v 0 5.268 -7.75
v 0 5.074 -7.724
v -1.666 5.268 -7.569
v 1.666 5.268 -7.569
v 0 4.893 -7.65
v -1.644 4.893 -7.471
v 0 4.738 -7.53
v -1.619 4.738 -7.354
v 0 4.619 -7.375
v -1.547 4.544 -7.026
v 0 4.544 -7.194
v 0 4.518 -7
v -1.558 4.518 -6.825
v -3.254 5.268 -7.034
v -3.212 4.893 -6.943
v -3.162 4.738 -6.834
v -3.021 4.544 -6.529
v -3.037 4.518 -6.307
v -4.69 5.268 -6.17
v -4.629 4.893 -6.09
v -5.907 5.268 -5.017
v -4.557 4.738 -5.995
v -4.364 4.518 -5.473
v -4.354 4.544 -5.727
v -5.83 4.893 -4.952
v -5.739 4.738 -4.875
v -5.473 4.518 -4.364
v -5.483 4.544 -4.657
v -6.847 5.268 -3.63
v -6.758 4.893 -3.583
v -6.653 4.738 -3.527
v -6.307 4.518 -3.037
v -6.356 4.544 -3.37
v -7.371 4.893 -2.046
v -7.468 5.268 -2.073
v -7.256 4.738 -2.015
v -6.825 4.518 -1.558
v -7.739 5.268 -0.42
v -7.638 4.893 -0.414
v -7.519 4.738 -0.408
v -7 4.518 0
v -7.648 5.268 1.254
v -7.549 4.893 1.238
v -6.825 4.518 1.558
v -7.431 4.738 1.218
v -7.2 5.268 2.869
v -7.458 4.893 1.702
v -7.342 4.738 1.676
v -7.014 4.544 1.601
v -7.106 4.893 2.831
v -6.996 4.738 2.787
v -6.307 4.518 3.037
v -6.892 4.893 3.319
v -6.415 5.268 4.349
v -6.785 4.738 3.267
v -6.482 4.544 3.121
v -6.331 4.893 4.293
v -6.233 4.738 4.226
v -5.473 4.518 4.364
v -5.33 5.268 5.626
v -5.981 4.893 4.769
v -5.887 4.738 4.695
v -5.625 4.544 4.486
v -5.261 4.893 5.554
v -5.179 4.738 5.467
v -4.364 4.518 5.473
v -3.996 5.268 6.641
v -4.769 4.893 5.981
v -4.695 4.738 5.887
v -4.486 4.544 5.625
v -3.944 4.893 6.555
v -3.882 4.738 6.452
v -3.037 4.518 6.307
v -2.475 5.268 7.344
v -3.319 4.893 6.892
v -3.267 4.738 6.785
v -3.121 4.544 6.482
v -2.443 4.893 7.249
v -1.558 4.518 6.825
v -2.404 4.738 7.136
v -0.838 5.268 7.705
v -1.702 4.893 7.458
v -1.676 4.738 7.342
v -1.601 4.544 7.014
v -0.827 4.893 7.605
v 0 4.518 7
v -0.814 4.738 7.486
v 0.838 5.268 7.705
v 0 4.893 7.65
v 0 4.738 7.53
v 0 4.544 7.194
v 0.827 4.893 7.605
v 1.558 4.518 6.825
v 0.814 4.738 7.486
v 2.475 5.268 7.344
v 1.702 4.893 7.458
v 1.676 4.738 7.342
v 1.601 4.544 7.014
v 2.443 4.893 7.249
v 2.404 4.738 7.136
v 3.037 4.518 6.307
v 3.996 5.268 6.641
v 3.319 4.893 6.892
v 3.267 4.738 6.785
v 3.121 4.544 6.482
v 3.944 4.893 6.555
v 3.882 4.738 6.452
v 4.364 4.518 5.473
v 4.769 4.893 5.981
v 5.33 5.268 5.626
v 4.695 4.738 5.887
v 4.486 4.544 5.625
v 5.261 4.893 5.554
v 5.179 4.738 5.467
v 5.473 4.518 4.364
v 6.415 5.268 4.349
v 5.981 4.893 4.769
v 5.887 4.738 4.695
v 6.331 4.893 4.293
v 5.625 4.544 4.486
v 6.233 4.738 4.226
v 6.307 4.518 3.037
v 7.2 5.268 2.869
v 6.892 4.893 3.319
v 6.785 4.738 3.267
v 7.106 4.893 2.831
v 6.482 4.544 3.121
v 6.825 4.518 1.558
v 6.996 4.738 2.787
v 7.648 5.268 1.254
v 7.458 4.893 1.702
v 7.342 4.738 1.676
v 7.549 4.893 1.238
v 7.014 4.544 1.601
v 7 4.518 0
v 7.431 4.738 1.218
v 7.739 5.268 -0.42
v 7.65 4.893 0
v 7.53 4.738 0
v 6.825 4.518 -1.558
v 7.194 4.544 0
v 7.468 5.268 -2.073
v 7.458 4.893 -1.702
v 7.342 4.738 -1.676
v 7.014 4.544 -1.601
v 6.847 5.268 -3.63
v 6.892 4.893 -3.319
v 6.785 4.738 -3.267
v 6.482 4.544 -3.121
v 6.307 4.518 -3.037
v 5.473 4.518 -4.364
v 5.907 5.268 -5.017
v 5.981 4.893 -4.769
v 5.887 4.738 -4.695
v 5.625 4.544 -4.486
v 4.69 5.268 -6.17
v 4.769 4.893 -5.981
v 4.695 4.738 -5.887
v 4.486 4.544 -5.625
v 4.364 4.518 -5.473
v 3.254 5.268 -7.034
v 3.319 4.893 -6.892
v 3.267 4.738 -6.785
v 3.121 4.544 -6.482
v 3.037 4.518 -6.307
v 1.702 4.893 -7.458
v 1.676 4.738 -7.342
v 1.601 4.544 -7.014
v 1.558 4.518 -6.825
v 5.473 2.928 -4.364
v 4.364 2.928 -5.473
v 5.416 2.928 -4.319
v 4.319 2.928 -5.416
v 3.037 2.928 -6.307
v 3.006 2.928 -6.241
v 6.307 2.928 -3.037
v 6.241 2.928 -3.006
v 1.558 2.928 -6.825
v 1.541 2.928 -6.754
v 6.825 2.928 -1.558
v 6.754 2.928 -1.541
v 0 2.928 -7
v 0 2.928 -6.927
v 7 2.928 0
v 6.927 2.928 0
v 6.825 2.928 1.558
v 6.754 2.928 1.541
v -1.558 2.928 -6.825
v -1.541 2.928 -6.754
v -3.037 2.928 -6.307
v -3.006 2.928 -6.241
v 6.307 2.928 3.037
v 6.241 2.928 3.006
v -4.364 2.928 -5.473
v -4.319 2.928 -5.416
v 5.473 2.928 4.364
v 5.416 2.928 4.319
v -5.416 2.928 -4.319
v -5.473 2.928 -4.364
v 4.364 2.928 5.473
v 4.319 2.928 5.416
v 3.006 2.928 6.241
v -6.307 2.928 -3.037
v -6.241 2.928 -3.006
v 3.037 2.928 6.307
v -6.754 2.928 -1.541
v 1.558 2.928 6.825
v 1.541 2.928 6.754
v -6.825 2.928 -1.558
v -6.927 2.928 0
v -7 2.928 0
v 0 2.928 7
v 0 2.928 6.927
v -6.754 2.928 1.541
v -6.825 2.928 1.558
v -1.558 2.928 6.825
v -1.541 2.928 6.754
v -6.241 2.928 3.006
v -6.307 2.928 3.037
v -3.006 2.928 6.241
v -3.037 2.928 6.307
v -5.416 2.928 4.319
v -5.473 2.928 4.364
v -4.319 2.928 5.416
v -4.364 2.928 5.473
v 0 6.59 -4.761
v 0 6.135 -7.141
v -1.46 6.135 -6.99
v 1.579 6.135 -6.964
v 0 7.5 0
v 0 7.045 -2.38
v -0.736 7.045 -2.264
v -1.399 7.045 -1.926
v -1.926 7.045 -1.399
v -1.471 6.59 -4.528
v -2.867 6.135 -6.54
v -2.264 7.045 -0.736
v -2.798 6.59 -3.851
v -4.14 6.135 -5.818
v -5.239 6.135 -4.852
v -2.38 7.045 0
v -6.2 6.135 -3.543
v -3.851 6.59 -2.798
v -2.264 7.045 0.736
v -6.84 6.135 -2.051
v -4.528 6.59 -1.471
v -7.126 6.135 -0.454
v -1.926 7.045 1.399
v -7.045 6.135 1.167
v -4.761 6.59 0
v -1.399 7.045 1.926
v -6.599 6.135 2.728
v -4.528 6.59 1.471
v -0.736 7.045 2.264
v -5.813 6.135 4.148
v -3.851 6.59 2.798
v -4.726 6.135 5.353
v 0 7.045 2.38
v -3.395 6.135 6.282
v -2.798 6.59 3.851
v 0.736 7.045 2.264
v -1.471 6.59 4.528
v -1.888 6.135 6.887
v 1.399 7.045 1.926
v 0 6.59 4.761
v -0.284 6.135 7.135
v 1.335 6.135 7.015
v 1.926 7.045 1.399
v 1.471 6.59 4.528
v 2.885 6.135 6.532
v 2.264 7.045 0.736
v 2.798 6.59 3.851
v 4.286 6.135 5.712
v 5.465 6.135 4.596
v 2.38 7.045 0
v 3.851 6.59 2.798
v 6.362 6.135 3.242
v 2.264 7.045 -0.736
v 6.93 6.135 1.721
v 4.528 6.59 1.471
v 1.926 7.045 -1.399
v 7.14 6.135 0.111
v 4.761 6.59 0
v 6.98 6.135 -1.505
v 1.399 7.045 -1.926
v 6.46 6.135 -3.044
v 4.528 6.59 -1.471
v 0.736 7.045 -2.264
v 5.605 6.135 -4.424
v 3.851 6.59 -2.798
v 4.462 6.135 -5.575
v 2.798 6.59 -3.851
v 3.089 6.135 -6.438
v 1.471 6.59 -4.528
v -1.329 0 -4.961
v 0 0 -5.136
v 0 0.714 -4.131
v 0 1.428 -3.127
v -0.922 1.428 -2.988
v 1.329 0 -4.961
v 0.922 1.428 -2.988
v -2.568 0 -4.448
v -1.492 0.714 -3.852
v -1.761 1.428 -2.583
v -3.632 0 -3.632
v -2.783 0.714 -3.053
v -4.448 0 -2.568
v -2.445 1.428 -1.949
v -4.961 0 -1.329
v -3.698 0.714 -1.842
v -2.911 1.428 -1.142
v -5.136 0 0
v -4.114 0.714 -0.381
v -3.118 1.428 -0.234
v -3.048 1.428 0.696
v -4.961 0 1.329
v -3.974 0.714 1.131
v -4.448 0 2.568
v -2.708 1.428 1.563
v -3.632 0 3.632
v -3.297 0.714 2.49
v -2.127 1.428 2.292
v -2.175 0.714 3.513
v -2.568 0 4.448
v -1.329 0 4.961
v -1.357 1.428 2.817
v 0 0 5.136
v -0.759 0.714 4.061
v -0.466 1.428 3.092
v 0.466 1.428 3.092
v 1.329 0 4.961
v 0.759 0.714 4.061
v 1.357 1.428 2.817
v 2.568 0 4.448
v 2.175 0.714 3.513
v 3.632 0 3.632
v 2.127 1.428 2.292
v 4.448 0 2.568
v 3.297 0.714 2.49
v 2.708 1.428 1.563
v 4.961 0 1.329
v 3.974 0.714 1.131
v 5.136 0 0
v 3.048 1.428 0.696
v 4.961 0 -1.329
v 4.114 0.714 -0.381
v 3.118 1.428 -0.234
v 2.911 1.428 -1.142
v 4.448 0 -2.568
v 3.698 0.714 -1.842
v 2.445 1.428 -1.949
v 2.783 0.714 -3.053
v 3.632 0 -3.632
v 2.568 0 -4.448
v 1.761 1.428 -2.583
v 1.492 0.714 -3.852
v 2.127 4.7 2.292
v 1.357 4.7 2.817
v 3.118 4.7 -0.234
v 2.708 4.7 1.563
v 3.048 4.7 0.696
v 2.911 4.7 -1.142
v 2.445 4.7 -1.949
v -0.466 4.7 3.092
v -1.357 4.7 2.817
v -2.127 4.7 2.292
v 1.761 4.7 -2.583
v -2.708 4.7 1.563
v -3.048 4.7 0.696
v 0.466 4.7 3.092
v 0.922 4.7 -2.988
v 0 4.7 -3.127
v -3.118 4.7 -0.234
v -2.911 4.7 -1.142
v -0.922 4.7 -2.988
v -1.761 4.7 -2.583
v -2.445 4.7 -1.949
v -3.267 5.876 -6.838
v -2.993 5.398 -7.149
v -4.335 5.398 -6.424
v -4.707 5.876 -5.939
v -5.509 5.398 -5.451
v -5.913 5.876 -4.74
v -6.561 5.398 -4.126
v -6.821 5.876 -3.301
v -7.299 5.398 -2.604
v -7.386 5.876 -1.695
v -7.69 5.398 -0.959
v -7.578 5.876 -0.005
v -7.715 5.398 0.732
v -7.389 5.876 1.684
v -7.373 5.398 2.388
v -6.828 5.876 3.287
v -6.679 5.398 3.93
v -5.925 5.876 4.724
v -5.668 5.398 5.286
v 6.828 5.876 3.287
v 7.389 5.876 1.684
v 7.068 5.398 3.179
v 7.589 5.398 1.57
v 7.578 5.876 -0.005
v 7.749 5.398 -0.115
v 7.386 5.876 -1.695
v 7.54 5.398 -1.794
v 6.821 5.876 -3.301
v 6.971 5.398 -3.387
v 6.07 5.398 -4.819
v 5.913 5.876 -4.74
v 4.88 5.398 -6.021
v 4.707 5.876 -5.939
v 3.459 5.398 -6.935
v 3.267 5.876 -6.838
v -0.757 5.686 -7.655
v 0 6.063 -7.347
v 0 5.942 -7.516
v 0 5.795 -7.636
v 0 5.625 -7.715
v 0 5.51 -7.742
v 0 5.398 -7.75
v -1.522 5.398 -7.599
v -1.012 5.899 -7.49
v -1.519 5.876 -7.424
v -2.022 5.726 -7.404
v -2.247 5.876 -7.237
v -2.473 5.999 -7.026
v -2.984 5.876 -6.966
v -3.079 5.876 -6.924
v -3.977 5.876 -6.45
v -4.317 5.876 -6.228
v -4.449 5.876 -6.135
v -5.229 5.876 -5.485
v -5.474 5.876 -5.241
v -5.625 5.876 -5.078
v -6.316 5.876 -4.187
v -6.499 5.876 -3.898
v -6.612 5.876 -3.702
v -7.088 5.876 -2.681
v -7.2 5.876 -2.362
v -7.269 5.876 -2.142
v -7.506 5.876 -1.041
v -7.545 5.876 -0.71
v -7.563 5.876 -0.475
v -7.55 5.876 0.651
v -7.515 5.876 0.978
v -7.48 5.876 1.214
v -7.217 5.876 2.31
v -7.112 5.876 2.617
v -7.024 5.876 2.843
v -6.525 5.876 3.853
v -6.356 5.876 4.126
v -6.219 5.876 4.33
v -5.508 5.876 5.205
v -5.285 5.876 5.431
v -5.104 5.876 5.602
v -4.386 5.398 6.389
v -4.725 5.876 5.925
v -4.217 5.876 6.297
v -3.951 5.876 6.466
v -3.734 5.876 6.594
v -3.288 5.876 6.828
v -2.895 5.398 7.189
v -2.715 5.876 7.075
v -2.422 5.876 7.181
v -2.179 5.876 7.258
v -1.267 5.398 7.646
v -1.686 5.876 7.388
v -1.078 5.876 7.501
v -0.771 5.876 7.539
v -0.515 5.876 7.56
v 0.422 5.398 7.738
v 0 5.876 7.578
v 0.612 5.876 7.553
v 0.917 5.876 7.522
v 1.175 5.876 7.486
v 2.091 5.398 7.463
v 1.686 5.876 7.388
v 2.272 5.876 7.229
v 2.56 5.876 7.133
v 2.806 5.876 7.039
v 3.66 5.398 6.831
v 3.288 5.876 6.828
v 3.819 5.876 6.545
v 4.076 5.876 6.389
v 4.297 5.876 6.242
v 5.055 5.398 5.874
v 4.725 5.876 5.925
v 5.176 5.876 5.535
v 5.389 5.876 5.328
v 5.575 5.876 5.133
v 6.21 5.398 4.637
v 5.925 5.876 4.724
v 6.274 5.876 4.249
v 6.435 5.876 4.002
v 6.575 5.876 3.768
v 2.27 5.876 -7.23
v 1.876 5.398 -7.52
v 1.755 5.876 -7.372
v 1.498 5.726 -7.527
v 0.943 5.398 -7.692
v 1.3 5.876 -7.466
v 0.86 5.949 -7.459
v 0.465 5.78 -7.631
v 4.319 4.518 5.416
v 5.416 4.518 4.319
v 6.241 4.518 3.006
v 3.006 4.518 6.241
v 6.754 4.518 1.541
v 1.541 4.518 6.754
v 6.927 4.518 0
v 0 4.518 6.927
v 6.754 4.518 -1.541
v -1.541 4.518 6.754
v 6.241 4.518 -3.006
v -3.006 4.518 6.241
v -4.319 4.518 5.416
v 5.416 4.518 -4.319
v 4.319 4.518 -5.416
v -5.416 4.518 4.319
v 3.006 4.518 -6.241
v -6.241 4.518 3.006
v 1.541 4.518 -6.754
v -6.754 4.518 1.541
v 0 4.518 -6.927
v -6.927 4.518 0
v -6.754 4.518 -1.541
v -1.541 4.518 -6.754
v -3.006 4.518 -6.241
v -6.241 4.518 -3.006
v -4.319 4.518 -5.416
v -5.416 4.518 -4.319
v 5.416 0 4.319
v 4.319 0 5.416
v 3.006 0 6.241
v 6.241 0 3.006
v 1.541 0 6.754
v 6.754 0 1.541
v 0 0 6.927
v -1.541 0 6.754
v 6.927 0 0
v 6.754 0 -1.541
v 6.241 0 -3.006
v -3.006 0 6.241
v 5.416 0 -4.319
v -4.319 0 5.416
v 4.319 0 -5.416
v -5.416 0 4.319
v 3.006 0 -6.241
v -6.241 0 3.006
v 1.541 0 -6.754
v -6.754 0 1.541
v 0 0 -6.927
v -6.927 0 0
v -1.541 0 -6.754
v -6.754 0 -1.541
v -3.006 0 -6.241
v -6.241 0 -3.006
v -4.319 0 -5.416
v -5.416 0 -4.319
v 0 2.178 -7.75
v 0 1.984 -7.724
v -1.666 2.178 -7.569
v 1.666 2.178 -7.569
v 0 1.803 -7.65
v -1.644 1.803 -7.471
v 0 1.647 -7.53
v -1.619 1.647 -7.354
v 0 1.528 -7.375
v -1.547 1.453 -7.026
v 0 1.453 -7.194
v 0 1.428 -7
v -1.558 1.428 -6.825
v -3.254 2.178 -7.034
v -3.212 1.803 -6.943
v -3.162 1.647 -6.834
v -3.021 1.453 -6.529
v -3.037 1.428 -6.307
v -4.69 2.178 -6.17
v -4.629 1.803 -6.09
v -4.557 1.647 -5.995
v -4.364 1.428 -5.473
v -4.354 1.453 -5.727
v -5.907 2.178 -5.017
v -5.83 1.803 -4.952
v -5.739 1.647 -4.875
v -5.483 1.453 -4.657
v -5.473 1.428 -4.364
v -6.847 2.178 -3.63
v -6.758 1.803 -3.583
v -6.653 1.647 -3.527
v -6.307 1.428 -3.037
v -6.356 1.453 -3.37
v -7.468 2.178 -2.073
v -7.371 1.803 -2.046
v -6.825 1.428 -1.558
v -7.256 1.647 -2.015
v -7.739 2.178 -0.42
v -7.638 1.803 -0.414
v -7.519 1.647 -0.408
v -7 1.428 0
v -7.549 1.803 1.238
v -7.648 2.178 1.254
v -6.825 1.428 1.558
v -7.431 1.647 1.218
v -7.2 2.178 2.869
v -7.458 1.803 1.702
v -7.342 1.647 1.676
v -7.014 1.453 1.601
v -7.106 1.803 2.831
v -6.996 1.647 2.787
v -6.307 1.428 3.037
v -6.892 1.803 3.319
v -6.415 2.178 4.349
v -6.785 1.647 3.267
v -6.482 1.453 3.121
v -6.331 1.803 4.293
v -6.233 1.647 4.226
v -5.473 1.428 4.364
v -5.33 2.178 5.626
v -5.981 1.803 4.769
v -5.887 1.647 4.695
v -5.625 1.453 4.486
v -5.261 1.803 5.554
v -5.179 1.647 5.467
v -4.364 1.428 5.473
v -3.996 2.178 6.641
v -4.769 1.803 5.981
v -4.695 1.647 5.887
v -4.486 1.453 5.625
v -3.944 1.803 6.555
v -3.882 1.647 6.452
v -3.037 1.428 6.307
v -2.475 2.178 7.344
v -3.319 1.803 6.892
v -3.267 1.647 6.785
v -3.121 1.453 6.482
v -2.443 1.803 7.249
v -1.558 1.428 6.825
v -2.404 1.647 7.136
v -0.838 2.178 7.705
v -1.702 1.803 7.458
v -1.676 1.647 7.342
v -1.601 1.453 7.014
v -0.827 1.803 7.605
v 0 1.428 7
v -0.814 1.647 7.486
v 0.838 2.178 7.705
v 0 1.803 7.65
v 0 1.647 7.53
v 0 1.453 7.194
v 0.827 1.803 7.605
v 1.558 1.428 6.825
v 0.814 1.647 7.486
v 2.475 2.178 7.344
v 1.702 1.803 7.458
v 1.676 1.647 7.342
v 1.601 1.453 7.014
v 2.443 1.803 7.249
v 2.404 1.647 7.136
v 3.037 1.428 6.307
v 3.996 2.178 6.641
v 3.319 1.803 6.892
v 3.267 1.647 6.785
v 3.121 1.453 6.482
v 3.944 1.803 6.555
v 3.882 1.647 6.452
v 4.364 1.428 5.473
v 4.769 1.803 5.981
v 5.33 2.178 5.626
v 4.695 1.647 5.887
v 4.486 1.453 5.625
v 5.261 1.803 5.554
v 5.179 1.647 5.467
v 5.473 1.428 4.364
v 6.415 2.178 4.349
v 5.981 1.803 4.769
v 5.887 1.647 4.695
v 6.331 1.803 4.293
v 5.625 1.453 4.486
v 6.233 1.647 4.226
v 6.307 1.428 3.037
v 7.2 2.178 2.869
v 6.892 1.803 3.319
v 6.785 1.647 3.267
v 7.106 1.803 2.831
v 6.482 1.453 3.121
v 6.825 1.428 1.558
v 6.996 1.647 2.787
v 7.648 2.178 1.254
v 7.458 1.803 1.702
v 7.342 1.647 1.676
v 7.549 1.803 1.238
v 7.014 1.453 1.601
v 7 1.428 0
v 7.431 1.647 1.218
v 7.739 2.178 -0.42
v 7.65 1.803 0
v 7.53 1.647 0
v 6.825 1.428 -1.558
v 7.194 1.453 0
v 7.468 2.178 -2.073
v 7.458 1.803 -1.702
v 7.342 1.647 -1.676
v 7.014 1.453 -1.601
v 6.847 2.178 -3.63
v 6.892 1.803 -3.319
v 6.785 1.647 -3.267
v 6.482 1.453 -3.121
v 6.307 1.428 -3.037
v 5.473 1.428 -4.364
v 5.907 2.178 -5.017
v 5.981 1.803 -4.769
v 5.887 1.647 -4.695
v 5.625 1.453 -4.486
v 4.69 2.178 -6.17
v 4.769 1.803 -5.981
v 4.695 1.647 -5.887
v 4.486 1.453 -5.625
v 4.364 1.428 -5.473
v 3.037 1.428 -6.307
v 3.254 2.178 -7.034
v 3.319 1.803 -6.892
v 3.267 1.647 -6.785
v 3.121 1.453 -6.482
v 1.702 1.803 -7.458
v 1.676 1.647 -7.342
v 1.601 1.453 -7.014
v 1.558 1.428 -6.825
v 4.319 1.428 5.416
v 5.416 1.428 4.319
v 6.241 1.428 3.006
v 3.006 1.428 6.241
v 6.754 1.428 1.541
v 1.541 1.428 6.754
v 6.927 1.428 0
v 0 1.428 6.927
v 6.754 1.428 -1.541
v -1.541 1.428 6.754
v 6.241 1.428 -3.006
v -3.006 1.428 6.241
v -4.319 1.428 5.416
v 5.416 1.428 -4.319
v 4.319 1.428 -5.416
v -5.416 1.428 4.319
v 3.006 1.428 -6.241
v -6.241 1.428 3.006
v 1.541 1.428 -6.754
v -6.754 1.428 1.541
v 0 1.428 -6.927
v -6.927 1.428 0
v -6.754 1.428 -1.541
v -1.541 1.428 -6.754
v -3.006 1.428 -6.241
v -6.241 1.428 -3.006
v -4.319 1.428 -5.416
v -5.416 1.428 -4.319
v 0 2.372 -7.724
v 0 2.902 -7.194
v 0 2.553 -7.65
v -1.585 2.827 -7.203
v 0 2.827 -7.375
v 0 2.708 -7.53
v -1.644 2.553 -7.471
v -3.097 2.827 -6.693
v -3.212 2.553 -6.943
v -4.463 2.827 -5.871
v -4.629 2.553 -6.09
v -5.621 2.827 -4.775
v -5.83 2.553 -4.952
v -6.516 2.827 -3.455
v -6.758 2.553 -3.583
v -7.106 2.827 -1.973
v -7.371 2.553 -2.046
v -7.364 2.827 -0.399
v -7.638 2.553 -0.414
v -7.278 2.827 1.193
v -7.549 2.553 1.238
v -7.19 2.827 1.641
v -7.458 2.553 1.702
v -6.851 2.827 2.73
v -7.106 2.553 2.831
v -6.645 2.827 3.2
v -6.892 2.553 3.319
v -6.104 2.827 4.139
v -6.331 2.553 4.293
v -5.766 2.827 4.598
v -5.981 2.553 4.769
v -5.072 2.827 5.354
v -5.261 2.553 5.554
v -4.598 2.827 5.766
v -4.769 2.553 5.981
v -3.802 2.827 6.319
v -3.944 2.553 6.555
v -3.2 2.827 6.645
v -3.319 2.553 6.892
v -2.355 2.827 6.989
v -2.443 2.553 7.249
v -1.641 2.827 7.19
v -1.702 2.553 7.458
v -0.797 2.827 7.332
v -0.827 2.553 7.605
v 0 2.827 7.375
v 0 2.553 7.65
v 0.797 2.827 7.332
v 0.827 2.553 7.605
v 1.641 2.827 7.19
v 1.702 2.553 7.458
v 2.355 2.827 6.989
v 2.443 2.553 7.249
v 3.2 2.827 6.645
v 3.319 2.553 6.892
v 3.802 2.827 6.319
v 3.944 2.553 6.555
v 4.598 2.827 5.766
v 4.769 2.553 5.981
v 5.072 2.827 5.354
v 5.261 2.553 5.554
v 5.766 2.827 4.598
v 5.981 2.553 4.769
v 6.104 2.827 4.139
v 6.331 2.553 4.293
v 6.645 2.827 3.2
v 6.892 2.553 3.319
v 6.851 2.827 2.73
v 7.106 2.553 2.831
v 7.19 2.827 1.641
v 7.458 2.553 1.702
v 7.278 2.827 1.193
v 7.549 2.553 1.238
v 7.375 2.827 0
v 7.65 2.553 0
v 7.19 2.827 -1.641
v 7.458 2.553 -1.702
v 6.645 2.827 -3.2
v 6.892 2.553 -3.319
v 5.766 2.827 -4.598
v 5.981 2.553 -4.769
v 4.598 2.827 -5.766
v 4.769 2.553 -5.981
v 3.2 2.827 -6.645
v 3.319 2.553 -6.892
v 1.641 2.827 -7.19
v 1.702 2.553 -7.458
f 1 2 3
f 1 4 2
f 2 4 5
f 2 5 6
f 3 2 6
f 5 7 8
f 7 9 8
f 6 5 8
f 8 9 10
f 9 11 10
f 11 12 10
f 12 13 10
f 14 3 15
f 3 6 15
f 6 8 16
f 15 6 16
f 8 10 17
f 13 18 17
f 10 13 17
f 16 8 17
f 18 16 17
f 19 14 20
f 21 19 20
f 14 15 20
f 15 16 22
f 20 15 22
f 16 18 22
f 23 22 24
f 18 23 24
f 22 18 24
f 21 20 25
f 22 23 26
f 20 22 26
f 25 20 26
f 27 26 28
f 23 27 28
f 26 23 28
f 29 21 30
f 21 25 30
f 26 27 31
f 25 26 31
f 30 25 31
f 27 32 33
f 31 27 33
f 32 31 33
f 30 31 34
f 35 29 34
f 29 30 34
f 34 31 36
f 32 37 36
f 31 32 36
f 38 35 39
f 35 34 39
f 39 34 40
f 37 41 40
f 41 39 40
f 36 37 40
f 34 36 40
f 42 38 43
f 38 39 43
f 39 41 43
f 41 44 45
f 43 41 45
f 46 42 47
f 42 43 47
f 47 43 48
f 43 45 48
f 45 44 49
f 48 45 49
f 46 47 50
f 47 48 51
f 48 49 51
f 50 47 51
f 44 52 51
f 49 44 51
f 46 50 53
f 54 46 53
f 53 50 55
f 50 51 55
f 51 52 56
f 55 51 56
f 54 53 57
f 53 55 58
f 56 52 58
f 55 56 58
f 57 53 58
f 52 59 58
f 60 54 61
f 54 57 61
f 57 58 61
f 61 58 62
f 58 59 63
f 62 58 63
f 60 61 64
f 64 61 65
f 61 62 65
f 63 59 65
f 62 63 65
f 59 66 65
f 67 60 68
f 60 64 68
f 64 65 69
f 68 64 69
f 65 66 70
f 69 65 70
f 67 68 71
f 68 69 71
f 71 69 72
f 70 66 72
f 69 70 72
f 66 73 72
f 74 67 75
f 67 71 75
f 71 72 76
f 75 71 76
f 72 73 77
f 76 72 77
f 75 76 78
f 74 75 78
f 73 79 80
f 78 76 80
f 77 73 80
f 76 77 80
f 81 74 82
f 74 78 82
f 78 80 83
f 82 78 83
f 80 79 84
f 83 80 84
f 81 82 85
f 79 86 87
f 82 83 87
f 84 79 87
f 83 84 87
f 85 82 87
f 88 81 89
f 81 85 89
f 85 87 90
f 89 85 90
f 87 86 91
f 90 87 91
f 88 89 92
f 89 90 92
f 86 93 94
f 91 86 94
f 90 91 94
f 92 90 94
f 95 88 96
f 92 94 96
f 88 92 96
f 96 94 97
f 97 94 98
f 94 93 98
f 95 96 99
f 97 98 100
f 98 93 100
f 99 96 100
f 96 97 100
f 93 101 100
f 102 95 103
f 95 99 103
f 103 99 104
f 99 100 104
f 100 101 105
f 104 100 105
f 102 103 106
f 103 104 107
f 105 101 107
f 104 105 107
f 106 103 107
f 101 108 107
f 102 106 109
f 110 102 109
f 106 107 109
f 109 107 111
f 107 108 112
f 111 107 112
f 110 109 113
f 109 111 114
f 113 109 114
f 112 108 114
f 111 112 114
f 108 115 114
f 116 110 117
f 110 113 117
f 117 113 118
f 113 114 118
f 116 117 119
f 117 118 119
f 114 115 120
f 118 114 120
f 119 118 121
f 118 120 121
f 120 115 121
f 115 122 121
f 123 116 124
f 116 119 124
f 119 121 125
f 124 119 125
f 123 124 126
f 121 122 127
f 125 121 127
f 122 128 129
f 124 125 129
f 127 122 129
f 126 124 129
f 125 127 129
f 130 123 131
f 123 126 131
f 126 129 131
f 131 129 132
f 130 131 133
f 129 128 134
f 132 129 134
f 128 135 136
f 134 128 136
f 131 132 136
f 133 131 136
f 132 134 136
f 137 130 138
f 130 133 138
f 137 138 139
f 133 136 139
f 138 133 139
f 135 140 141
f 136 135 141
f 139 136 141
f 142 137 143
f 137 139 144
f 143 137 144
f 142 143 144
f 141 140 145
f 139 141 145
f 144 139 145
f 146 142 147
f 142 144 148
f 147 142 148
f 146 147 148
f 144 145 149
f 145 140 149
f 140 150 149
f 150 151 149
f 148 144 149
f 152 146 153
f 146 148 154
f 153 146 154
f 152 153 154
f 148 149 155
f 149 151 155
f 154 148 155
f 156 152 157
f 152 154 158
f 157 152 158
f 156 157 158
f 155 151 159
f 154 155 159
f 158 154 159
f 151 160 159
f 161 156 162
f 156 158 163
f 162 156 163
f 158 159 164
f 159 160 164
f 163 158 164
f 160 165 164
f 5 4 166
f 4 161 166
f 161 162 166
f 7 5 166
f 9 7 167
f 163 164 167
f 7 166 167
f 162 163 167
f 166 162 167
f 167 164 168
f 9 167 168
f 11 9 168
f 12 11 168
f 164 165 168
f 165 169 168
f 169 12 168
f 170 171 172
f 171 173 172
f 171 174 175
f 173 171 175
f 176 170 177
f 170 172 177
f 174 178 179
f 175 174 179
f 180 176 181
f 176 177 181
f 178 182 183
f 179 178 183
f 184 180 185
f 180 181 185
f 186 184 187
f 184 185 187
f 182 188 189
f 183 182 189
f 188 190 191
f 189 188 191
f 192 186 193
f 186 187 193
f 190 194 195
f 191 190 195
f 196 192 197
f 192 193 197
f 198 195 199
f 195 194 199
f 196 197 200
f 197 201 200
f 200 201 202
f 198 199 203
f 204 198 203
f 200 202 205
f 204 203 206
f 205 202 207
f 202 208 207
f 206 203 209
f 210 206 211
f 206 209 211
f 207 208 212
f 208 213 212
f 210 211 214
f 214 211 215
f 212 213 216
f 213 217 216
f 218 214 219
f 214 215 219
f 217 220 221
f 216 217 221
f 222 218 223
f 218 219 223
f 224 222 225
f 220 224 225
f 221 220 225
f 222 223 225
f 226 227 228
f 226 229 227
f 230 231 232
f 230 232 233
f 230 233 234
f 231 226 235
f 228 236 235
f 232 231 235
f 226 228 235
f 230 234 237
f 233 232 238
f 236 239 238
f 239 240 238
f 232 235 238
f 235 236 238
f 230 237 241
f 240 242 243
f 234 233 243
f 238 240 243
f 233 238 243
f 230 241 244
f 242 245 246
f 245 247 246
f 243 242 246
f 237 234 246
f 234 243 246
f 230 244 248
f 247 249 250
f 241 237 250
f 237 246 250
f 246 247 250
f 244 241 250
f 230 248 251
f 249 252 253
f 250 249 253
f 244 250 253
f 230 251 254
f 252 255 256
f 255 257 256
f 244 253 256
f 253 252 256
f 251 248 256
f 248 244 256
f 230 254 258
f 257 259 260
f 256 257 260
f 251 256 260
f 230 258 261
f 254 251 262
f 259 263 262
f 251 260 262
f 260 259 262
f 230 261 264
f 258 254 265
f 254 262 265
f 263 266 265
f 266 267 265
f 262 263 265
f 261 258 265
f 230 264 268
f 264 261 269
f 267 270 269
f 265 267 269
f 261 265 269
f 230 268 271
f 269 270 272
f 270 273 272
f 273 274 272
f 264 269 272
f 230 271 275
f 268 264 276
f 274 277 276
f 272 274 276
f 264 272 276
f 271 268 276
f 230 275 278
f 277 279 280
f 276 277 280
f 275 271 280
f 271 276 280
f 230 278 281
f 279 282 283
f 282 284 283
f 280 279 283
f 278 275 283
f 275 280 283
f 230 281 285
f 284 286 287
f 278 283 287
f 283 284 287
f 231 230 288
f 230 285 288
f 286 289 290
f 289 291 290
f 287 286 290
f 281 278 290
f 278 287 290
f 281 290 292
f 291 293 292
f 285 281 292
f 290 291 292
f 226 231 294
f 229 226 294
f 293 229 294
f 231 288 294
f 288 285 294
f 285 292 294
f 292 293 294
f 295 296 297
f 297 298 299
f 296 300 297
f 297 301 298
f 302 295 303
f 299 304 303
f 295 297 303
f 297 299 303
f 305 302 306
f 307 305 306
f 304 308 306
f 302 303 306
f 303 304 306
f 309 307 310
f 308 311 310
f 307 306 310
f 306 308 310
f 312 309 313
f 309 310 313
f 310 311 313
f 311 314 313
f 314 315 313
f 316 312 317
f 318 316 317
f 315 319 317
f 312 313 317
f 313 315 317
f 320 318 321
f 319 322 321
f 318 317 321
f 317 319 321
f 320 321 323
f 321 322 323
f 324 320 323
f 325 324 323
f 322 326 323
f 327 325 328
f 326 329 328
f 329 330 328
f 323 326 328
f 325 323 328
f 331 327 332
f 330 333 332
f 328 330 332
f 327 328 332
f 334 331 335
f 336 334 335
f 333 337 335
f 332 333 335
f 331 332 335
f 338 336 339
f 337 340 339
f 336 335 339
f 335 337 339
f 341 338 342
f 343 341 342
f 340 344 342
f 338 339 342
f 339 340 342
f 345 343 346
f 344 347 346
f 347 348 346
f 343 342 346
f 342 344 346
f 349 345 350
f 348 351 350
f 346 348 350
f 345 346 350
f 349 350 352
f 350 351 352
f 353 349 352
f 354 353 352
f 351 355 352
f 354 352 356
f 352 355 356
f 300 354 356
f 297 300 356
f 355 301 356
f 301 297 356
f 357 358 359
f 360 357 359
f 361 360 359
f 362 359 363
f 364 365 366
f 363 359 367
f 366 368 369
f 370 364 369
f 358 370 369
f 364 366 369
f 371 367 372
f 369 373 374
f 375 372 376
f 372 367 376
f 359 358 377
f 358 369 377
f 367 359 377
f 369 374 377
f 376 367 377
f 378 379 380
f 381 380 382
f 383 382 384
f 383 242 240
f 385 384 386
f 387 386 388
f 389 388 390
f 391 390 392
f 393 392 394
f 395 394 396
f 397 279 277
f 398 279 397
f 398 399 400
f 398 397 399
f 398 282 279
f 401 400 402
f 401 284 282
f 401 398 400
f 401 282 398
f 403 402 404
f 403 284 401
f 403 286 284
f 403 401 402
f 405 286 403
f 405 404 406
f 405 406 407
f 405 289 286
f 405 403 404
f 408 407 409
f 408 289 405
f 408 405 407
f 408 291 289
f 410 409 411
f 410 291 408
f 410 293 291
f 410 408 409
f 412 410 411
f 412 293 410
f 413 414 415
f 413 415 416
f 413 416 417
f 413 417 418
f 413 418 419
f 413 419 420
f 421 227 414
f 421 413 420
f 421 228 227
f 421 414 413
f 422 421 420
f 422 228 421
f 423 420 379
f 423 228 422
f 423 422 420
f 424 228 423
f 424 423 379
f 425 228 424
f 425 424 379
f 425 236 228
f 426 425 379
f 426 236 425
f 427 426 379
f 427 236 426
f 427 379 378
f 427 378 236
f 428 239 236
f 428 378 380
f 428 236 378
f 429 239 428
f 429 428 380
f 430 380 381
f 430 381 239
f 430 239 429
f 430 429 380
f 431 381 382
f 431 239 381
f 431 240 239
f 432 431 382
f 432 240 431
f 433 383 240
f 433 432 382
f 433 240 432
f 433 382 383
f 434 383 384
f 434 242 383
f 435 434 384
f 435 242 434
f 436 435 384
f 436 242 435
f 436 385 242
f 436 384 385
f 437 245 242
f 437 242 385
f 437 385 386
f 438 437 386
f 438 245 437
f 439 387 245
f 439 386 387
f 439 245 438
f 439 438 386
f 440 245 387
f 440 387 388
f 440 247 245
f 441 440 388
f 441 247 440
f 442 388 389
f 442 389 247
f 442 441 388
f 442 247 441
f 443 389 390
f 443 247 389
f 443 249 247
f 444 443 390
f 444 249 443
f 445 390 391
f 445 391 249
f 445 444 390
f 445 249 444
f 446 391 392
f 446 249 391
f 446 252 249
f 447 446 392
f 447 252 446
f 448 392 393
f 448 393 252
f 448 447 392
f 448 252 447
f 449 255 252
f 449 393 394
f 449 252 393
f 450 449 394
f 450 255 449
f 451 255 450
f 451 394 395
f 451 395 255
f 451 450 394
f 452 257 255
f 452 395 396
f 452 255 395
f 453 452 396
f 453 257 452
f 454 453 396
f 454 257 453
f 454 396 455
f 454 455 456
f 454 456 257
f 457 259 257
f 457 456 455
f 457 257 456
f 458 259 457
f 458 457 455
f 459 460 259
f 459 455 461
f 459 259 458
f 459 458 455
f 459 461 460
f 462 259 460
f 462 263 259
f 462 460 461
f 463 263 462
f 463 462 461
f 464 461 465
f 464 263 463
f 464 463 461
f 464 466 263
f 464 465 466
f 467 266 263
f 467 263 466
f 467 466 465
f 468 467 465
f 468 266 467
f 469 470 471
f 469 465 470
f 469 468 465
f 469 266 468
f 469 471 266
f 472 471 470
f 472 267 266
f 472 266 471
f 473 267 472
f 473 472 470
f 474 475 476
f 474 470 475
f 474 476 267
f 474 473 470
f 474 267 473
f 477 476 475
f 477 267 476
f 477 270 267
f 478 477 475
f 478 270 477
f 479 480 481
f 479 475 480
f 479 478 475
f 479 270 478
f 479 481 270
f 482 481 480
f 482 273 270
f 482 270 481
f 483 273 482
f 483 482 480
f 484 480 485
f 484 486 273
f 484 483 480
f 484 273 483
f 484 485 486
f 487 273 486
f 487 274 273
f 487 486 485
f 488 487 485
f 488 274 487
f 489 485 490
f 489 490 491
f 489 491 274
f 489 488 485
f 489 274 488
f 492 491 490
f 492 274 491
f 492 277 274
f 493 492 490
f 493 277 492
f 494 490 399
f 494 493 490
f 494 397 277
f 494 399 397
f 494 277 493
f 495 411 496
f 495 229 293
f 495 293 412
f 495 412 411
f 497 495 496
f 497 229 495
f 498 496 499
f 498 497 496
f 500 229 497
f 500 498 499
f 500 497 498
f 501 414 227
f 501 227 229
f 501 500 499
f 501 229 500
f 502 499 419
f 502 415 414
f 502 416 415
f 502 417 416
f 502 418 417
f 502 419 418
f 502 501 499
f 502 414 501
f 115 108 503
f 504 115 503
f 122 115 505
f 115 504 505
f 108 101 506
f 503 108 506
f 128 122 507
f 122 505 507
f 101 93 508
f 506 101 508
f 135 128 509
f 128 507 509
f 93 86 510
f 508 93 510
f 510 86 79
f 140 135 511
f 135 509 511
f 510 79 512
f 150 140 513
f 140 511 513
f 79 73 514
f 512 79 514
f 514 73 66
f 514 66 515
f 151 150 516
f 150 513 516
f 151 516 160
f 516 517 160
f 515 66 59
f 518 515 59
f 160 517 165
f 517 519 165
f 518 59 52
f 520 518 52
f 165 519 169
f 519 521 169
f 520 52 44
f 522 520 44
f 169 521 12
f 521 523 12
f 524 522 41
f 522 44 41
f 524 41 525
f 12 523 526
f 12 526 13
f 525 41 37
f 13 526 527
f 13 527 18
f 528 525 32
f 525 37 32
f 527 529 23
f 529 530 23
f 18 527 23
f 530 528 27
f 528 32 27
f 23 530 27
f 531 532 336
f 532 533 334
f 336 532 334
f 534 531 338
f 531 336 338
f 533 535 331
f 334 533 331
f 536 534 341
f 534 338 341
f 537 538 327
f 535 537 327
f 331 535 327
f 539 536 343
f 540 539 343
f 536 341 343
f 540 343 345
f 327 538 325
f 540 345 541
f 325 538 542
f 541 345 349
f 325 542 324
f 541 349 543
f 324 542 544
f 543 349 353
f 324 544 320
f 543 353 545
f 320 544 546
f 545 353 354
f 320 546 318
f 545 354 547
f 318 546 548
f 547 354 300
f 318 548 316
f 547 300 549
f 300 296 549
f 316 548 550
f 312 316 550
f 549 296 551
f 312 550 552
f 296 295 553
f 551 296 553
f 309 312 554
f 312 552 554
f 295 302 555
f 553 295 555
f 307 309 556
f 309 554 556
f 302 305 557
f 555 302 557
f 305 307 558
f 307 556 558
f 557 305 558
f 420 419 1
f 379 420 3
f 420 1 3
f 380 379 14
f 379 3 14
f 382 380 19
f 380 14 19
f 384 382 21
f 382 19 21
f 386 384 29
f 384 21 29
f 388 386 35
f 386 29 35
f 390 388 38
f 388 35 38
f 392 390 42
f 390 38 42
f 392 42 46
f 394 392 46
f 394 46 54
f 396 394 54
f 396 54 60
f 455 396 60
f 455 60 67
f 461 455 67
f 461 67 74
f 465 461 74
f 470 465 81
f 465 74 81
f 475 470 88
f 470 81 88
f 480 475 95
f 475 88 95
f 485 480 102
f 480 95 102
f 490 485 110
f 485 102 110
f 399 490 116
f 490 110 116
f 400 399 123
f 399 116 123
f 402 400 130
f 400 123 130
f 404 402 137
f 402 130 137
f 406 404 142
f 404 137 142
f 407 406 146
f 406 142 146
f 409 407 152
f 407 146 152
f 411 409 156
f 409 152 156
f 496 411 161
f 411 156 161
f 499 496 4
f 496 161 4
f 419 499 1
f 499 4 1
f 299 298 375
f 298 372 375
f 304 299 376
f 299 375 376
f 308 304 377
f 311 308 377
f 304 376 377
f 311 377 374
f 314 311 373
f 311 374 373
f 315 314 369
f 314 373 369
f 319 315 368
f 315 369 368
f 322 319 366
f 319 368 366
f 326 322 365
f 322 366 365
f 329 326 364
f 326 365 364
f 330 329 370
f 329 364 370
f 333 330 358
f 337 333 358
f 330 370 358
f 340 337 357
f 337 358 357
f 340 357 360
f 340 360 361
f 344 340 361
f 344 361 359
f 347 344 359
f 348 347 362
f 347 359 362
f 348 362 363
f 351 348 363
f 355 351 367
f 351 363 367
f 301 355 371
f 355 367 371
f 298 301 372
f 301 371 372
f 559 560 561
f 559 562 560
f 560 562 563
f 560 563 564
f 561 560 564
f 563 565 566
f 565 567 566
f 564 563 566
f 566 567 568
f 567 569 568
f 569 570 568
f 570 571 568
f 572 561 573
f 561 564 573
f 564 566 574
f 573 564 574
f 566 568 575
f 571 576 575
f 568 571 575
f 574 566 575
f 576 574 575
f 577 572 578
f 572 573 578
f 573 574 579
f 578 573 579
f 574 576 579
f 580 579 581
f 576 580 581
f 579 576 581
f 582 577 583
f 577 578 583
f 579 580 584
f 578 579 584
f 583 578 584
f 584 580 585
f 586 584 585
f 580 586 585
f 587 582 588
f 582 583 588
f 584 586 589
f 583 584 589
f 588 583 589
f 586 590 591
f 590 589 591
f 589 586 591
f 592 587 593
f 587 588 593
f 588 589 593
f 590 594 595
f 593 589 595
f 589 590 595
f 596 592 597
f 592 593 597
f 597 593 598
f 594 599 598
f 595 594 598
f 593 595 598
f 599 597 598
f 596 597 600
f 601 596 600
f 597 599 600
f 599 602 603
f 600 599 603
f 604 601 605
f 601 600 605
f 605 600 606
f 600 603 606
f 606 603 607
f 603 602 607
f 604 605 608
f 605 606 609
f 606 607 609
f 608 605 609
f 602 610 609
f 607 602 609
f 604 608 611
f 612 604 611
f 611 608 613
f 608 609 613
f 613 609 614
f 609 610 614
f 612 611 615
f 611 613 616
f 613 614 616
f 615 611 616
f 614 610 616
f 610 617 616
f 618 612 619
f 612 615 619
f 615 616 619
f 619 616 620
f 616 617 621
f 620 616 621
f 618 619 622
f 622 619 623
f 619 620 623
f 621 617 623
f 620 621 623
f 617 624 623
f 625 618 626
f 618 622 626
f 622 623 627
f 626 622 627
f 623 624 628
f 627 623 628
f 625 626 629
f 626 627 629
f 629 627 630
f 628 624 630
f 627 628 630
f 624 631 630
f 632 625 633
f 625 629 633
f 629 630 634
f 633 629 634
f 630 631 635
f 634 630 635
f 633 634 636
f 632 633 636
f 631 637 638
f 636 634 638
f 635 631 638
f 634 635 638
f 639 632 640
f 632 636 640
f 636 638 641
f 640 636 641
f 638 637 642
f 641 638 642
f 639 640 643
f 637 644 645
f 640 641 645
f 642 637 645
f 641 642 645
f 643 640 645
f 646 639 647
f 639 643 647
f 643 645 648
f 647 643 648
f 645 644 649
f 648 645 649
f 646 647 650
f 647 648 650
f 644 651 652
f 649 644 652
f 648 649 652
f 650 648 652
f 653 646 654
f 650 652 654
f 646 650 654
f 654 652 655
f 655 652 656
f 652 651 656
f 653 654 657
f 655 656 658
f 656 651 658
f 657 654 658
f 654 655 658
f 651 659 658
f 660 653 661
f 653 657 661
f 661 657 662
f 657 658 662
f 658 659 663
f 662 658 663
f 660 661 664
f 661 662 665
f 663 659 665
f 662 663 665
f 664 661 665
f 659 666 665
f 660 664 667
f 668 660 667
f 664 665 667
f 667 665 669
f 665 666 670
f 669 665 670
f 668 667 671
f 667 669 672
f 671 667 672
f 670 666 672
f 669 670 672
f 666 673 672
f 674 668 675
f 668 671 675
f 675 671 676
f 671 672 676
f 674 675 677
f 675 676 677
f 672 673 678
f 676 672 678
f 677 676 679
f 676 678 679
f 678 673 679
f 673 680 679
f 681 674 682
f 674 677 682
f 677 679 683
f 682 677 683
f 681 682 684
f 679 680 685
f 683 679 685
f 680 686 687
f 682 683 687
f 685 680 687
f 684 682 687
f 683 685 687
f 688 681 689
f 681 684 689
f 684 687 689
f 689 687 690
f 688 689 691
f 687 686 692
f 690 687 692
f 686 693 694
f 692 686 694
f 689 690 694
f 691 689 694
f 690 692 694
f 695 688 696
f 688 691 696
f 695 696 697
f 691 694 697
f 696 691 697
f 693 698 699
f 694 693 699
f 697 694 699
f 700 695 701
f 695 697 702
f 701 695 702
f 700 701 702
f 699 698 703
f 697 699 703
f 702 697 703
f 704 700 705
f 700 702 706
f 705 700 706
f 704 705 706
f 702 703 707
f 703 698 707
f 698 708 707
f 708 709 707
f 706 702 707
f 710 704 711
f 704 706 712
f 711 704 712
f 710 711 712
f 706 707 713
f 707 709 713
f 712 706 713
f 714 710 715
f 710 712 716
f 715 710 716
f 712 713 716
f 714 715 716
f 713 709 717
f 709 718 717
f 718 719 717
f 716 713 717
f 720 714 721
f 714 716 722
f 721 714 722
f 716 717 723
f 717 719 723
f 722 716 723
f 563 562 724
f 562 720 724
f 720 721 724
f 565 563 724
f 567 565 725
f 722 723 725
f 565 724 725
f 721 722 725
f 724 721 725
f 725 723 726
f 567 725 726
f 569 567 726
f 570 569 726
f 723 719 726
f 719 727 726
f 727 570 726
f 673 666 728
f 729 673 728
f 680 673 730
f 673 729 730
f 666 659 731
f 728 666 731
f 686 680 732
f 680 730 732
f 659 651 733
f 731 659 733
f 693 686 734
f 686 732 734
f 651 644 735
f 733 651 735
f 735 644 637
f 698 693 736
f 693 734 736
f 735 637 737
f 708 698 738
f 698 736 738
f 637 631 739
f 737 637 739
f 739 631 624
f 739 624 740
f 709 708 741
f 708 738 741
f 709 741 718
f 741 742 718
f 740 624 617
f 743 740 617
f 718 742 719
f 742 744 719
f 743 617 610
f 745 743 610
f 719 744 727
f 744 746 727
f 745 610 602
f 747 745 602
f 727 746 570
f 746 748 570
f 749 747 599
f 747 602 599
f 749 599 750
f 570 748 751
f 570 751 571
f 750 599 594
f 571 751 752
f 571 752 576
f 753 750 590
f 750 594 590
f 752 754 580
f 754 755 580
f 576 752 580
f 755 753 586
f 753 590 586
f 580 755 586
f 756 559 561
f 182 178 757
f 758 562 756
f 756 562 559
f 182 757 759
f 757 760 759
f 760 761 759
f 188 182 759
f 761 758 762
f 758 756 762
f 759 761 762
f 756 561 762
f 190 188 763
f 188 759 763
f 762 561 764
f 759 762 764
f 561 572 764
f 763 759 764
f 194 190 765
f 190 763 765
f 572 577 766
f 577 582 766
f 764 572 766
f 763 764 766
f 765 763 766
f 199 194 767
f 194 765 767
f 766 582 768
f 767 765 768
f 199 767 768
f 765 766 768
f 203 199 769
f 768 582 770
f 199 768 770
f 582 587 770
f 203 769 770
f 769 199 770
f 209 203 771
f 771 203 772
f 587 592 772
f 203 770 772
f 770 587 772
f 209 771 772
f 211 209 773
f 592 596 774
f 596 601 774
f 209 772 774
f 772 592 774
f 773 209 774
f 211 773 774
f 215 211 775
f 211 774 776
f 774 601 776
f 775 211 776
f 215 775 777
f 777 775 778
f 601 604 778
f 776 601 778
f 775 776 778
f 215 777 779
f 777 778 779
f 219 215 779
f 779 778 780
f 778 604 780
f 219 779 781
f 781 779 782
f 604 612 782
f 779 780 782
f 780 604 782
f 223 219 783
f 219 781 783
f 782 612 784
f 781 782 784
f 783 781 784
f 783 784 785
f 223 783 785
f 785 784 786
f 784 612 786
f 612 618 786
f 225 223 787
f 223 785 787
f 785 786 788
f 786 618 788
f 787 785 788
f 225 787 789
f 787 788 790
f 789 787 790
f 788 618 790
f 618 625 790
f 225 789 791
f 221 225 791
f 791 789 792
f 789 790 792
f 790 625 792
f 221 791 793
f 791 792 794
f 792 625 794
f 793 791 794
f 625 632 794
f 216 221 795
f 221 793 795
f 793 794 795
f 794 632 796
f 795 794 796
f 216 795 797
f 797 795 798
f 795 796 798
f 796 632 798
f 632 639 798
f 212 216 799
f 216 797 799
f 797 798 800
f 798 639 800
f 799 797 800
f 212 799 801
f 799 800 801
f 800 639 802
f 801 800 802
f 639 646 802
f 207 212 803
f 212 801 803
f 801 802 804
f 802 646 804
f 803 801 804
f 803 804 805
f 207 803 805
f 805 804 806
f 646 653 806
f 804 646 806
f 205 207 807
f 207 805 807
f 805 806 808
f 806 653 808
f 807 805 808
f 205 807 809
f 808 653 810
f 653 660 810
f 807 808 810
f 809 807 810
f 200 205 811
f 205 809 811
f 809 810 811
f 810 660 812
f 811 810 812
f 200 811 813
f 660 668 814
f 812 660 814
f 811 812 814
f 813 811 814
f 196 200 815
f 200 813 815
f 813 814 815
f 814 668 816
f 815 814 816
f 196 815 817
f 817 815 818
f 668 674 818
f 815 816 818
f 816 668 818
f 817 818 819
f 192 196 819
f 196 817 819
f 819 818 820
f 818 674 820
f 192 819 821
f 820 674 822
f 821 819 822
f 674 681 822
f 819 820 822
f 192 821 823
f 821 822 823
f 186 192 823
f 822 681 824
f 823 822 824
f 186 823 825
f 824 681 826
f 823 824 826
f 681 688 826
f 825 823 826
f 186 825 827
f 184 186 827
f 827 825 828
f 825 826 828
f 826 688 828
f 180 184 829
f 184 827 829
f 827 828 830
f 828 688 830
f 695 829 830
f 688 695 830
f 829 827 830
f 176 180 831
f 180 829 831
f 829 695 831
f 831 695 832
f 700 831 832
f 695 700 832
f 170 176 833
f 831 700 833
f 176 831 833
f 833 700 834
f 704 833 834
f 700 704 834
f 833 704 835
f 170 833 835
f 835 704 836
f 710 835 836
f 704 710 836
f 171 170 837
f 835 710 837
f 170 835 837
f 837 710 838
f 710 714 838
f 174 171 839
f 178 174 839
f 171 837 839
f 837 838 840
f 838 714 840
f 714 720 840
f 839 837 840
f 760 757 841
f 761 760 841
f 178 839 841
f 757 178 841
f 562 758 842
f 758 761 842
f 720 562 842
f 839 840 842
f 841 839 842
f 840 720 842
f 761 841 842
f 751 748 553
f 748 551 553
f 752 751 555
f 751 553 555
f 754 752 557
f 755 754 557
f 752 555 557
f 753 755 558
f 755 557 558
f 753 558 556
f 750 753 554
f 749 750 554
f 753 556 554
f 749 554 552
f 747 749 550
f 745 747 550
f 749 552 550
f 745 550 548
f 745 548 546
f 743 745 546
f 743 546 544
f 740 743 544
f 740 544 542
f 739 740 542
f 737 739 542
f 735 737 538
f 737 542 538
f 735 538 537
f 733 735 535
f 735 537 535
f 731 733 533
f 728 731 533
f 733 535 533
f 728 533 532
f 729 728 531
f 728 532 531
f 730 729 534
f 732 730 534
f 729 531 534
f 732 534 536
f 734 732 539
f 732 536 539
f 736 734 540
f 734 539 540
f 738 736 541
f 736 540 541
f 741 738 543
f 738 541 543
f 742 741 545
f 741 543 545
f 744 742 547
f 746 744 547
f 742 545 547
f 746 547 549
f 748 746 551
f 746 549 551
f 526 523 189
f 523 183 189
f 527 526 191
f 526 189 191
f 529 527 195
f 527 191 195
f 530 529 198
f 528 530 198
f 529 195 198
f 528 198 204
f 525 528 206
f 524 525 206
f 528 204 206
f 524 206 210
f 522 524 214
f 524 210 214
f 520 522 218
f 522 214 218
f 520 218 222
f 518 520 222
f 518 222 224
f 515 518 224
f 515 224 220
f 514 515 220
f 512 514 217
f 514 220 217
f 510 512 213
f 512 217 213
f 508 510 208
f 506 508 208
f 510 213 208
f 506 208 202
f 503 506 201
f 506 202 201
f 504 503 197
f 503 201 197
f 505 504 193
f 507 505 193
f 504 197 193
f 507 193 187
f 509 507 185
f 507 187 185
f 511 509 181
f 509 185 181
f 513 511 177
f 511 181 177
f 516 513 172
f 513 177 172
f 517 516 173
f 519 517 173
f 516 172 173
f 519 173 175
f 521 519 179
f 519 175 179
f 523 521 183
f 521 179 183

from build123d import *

# Parameters (mm, degrees)
FILLET1_R = 0.75


with BuildPart() as part:
    # Sketch1 → Revolve1 (revolve)
    with BuildSketch(Plane.XY, mode=Mode.PRIVATE) as revolve1_sk:
        Polygon((0, 7.5), (-7.75, 6.018214298), (-7.75, 4.518214298), (-6.927372109, 4.518214298), (-6.927372109, 2.927787826), (-7.75, 2.927787826), (-7.75, 1.427787826), (-6.927372109, 1.427787826), (-6.927372109, 0), (-5.136257755, 0), (-3.126714823, 1.427787826), (-3.126714823, 4.7), (0, 4.7), align=None)
    revolve(revolve1_sk.sketch.rotate(Axis((0, 0, 0), (0, 1, 0)), 270), axis=Axis((0, 0, 0), (0, 1, 0)))

    # Fillet1
    fillet1_edges = [part.edges().sort_by_distance(p)[0] for p in [
        (0, 6.018214298, 7.75),
        (0, 4.518214298, 7.75),
        (0, 2.927787826, 7.75),
        (0, 1.427787826, 7.75),
    ]]
    fillet(fillet1_edges, radius=FILLET1_R - 0.0001)  # a hair under: the kernel refuses the full size


solid = part.part
